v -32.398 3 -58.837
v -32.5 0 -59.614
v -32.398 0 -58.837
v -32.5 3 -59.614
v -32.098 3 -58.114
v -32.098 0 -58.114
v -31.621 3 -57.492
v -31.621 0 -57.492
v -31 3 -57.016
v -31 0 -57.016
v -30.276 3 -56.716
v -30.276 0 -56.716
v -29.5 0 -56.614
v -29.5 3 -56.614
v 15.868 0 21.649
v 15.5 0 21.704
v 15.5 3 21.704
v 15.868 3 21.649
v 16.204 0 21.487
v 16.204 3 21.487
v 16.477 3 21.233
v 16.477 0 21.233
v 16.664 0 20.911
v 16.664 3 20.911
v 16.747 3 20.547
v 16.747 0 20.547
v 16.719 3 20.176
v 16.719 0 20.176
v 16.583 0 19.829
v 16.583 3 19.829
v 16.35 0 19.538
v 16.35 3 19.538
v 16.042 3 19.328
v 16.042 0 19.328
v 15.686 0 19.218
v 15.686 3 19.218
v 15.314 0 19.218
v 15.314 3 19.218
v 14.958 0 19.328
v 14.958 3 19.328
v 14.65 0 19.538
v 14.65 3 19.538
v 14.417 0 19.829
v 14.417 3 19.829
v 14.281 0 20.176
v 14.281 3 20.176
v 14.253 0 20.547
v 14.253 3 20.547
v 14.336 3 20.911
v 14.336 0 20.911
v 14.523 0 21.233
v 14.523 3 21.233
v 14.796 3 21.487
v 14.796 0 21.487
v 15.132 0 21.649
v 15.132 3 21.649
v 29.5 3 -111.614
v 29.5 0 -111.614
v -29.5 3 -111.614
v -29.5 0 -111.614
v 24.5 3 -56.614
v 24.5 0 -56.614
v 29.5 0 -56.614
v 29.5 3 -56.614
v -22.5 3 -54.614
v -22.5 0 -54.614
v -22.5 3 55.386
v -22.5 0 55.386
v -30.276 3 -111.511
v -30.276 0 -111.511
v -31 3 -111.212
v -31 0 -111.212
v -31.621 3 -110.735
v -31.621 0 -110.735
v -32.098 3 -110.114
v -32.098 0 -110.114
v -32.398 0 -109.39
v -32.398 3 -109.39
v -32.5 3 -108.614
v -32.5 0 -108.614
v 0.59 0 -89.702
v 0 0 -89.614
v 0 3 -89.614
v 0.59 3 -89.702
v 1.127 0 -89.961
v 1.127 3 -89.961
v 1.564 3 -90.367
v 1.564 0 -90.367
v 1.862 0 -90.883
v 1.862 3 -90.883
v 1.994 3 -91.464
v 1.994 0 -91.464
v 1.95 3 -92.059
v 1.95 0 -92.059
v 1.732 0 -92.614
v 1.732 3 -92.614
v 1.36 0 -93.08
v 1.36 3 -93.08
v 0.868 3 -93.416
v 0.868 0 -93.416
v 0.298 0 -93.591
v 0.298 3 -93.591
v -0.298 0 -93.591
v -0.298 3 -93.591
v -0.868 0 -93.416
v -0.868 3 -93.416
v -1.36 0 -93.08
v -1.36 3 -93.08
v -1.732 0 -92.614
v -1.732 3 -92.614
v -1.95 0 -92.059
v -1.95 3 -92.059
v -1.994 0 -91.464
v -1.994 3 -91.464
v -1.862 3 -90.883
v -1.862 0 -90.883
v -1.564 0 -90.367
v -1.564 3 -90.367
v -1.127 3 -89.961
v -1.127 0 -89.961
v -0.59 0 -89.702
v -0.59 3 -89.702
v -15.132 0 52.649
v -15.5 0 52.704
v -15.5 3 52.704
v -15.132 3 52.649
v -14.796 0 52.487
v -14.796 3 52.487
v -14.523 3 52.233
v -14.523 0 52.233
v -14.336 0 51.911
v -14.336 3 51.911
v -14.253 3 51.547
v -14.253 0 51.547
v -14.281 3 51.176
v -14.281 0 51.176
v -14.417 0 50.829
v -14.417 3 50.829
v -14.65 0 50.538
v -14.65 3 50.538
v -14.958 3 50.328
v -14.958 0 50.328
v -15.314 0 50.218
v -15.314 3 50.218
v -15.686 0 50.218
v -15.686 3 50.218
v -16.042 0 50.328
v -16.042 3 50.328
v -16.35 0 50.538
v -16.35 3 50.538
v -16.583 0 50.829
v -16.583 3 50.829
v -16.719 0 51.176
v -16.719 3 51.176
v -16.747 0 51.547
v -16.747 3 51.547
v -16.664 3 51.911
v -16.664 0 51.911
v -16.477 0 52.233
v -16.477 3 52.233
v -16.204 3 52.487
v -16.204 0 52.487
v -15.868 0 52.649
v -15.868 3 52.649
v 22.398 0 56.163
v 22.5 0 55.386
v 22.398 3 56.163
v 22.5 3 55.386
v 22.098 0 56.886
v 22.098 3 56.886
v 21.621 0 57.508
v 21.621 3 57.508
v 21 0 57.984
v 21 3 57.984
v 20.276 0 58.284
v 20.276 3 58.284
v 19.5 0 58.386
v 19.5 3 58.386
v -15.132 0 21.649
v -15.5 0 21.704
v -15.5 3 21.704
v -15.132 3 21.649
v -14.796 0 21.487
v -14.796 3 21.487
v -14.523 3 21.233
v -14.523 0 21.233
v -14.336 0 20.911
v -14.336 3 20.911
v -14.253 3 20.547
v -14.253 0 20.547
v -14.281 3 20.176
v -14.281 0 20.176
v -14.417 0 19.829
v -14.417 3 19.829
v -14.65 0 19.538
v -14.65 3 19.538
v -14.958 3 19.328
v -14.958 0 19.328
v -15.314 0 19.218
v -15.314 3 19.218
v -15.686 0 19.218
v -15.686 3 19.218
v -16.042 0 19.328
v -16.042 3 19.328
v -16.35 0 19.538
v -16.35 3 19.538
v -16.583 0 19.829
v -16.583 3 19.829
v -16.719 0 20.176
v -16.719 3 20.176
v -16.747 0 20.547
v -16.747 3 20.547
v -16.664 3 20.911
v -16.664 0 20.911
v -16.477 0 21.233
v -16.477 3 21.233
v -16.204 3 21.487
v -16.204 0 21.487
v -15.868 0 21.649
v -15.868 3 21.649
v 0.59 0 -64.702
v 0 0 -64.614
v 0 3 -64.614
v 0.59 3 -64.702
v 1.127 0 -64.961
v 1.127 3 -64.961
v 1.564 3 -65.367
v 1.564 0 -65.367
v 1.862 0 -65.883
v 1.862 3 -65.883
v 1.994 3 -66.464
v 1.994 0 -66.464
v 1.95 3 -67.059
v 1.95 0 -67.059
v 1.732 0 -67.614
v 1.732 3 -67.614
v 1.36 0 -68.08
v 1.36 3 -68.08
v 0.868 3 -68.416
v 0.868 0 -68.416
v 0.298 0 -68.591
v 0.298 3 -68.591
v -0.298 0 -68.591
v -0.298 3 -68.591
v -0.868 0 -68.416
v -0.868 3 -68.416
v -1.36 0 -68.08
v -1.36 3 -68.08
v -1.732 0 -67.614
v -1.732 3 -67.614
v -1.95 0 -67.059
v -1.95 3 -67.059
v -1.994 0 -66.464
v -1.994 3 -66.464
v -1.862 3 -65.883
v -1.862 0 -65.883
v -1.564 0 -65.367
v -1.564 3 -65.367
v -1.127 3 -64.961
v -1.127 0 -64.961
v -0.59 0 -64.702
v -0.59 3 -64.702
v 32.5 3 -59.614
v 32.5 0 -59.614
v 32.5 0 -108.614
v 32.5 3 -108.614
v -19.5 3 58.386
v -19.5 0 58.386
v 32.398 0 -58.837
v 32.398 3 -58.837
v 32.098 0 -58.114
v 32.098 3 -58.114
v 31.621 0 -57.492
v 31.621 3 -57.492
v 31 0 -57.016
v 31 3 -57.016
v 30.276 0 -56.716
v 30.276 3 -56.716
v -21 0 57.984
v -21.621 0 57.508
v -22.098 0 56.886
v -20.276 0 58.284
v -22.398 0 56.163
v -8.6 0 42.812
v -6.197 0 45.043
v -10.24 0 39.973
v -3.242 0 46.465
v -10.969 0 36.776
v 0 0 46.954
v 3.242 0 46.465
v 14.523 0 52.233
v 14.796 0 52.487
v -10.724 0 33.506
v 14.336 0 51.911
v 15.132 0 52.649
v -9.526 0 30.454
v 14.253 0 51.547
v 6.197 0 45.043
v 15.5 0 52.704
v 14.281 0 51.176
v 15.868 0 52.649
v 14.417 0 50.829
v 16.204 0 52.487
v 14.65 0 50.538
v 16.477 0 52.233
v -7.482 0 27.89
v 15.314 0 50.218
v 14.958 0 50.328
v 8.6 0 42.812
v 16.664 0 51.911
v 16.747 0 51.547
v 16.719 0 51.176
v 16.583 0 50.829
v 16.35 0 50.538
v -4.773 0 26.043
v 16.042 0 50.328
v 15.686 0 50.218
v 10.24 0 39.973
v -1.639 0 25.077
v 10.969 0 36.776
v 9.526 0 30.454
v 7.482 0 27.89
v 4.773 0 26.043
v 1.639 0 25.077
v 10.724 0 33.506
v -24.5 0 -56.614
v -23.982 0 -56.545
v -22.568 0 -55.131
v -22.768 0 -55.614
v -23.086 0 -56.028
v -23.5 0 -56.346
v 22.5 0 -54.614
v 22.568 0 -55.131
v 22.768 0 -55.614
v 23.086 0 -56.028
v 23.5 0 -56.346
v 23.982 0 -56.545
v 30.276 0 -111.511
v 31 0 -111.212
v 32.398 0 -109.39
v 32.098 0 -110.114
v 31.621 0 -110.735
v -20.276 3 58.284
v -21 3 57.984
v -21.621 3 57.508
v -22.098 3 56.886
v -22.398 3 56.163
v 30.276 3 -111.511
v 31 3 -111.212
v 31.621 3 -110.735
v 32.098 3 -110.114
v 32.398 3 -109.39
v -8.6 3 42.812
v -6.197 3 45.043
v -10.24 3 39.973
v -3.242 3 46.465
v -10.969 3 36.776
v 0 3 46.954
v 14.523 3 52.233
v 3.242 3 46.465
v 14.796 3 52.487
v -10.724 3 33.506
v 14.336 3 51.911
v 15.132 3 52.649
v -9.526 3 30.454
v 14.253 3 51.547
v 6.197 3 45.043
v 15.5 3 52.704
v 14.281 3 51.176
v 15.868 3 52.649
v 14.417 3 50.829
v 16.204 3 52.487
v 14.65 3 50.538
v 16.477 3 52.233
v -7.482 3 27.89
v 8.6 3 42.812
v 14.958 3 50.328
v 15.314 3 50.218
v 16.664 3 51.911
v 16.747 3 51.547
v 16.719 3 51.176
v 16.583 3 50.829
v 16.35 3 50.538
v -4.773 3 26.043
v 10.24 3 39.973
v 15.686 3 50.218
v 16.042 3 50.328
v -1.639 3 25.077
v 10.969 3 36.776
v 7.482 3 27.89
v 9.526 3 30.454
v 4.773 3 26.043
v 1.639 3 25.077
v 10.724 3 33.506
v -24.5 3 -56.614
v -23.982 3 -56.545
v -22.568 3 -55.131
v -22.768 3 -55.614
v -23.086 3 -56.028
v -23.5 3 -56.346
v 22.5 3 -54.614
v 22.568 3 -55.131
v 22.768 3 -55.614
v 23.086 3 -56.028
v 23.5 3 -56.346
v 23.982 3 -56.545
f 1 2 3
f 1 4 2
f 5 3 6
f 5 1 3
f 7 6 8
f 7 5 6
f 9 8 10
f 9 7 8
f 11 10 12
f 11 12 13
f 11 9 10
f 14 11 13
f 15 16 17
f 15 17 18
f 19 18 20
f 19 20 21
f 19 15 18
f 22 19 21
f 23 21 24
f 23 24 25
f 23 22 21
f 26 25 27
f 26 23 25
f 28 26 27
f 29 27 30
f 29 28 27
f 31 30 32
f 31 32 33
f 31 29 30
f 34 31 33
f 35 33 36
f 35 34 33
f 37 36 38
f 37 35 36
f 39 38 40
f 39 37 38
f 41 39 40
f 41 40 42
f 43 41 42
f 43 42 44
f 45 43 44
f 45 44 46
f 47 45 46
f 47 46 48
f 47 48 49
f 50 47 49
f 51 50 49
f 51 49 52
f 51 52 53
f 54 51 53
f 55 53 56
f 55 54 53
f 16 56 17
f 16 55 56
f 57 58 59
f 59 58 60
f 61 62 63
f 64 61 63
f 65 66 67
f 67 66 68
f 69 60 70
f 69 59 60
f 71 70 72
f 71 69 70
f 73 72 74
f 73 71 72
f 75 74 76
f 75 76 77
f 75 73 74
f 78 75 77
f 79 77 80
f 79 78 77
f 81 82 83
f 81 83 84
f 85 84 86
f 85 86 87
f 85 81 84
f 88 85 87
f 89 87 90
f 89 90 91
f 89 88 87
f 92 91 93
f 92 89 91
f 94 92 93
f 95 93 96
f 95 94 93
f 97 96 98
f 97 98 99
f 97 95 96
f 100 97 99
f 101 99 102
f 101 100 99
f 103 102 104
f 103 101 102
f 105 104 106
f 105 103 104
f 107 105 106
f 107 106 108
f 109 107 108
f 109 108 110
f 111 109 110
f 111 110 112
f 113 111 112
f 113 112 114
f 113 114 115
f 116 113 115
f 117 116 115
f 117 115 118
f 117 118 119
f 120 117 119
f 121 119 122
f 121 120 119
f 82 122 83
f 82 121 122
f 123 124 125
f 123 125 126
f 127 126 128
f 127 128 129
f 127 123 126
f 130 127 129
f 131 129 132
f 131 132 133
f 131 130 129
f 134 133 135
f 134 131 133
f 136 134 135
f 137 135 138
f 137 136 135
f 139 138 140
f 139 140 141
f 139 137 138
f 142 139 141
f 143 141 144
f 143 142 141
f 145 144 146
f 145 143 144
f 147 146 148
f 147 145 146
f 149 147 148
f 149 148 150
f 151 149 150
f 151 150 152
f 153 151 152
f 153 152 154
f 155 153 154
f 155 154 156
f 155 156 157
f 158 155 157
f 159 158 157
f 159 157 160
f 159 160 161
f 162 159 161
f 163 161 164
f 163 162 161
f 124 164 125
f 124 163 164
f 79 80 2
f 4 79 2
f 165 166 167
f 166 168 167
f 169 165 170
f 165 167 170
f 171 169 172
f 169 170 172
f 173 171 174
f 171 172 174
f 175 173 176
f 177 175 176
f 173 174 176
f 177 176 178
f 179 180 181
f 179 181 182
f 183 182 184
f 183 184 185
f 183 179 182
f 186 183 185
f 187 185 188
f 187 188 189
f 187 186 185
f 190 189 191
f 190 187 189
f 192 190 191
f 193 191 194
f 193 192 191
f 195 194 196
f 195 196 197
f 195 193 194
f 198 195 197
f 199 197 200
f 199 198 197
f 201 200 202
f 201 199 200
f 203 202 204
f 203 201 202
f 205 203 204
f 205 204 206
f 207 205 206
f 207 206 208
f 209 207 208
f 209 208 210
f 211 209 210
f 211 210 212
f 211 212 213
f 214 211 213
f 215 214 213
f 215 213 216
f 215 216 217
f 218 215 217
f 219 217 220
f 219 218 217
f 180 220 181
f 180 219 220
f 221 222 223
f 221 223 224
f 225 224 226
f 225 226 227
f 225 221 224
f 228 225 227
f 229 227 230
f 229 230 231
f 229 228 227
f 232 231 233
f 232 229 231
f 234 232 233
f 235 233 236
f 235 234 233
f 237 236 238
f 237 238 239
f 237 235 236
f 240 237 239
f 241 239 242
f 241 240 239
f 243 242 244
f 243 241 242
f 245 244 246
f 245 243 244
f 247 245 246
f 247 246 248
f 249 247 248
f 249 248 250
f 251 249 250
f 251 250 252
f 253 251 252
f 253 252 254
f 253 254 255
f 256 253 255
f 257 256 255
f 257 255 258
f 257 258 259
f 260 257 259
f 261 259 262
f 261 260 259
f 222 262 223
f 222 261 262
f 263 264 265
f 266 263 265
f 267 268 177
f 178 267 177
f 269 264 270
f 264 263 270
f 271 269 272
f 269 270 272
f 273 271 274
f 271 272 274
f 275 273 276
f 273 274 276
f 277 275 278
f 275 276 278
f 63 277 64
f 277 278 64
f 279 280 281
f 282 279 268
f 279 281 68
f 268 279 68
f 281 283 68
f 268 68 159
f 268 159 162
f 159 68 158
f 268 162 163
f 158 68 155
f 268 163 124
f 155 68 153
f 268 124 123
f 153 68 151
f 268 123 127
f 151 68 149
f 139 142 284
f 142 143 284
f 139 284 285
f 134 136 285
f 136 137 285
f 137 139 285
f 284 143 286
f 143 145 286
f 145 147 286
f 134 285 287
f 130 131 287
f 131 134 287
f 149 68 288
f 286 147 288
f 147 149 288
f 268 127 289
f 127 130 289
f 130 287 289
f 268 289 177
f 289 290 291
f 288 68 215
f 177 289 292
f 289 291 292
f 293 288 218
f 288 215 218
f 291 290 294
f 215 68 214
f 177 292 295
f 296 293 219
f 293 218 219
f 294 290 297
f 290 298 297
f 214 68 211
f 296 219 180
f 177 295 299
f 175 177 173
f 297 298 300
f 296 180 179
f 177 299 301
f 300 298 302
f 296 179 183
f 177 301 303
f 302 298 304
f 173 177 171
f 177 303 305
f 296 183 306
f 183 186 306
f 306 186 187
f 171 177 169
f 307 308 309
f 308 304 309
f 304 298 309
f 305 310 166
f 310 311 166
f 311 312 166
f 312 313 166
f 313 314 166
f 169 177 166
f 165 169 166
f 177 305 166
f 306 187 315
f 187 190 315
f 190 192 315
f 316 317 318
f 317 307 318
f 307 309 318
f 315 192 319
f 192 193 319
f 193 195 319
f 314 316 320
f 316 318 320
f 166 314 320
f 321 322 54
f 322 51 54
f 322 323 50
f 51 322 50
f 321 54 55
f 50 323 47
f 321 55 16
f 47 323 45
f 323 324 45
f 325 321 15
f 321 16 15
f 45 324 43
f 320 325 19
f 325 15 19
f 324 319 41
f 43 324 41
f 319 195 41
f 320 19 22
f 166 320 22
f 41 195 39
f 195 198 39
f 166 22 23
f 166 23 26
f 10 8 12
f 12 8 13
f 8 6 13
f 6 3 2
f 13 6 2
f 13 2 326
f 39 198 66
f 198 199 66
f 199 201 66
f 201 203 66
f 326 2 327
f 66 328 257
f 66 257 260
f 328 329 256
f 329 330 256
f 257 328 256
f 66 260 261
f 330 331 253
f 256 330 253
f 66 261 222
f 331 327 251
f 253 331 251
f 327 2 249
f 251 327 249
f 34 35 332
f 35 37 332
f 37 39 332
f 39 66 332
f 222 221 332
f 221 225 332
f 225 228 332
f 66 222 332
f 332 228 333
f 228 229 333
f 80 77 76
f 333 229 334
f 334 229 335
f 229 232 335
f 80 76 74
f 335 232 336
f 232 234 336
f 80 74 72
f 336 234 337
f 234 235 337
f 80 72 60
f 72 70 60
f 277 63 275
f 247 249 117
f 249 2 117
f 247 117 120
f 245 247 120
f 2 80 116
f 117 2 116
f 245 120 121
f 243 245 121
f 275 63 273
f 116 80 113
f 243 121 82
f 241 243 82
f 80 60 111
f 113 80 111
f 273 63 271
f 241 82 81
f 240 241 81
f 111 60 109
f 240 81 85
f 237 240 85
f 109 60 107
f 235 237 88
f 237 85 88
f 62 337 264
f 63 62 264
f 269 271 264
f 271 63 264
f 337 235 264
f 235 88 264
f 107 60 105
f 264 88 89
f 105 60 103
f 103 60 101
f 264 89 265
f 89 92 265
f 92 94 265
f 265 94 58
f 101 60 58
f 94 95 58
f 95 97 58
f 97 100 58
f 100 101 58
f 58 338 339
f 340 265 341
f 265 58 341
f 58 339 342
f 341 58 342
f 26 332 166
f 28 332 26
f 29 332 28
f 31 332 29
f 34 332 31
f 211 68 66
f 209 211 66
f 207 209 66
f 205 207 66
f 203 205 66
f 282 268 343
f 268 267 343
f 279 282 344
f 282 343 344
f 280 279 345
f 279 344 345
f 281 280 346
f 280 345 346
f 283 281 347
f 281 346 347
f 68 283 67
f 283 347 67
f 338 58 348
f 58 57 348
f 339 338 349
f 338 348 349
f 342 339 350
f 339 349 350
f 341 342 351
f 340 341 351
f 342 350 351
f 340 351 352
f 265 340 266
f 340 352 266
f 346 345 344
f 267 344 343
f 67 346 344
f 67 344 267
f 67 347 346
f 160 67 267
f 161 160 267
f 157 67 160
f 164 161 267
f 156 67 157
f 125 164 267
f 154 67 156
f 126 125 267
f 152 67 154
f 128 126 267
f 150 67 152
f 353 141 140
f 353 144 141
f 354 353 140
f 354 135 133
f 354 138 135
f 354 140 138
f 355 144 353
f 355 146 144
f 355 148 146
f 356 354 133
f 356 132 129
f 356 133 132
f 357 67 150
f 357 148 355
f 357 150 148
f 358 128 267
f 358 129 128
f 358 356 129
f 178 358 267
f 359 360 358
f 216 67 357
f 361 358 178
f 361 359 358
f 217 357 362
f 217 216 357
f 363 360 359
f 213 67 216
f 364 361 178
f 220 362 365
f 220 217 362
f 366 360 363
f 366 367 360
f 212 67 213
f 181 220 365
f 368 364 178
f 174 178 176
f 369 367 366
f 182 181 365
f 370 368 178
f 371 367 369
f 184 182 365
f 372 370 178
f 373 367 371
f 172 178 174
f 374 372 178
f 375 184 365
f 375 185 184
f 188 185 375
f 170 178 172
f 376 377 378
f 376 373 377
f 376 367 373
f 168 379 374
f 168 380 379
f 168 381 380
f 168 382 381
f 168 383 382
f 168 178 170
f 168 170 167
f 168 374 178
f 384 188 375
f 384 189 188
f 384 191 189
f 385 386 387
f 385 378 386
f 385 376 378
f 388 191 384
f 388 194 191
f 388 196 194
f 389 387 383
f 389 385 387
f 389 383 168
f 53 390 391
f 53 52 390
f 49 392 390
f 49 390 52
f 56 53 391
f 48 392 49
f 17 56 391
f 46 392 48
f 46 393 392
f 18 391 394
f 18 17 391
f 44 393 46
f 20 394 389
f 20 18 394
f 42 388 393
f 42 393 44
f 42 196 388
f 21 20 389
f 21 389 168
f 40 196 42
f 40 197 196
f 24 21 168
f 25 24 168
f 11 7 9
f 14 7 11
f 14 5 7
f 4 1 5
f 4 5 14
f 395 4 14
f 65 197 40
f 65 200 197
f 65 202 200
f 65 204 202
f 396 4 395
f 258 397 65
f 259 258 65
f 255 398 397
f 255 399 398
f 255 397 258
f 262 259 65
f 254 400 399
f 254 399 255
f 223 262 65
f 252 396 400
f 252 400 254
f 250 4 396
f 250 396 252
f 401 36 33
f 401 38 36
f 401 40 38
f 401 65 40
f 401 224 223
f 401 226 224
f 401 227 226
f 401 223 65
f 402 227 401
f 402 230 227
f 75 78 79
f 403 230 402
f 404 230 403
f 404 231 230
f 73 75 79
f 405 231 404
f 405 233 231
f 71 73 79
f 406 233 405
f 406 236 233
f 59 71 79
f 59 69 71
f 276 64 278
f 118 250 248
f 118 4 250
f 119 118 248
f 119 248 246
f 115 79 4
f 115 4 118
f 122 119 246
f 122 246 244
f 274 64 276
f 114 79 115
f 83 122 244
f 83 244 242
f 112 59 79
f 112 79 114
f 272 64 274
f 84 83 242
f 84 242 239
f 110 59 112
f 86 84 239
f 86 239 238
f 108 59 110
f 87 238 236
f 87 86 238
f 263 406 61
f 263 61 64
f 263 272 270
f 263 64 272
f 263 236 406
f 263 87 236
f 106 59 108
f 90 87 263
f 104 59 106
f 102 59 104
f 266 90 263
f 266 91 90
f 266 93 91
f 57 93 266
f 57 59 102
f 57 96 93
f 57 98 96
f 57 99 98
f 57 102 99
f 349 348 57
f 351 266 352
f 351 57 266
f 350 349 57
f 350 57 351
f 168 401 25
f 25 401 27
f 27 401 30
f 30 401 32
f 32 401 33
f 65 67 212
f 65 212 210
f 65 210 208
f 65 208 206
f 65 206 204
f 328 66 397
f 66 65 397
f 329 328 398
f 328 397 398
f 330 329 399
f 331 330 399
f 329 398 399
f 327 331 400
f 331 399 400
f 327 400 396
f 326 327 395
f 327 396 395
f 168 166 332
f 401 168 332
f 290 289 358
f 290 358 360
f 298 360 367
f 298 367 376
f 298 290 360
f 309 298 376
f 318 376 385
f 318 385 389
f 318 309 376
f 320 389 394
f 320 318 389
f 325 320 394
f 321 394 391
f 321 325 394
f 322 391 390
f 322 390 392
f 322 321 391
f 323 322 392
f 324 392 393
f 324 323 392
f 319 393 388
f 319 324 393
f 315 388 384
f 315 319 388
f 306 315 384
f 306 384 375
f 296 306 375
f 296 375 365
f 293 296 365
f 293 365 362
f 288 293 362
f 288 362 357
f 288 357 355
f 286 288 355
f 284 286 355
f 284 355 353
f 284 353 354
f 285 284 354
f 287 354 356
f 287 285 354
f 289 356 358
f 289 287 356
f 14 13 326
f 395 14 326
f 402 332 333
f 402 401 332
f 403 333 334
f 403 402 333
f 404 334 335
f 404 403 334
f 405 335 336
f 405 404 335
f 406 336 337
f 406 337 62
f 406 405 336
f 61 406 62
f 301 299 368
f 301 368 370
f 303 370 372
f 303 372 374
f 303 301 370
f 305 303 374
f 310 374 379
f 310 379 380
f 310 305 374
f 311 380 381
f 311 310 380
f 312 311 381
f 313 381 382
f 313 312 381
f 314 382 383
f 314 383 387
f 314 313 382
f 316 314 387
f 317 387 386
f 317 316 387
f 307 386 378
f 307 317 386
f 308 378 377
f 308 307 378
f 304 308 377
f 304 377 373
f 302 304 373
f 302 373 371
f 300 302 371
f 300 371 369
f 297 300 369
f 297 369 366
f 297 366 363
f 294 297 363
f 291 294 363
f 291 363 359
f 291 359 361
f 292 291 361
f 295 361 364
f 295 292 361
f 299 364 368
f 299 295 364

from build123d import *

# Parameters (mm, degrees)
SKETCH1_R           = 2
SKETCH1_R_2         = 1.25
SKETCH1_R_3         = 11
BOSS_EXTRUDE1_DEPTH = 3
FILLET1_R           = 3
FILLET2_R           = 3
FILLET3_R           = 3
FILLET4_R           = 3
FILLET5_R           = 3
FILLET7_R           = 3
FILLET8_R           = 2
FILLET9_R           = 2


with BuildPart() as part:
    # Sketch1 → Boss-Extrude1 (new body)
    with BuildSketch(Plane(origin=(0, 0, 0), x_dir=(1, 0, 0), z_dir=(0, 1, 0))):
        Polygon((0, 111.61362417), (-32.5, 111.61362417), (-32.5, 56.61362417), (-22.5, 56.61362417), (-22.5, -58.38637583), (0, -58.38637583), (22.5, -58.38637583), (22.5, 56.61362417), (32.5, 56.61362417), (32.5, 111.61362417), align=None)
        with Locations(Location((0, 91.61362417, 0), (0, 0, 270))):
            Circle(SKETCH1_R, mode=Mode.SUBTRACT)
        with Locations(Location((0, 66.61362417, 0), (0, 0, 270))):
            Circle(SKETCH1_R, mode=Mode.SUBTRACT)
        with Locations(Location((-15.5, -20.454039675, 0), (0, 0, 270))):
            Circle(SKETCH1_R_2, mode=Mode.SUBTRACT)
        with Locations(Location((-15.5, -51.454039675, 0), (0, 0, 270))):
            Circle(SKETCH1_R_2, mode=Mode.SUBTRACT)
        with Locations(Location((15.5, -51.454039675, 0), (0, 0, 270))):
            Circle(SKETCH1_R_2, mode=Mode.SUBTRACT)
        with Locations(Location((15.5, -20.454039675, 0), (0, 0, 270))):
            Circle(SKETCH1_R_2, mode=Mode.SUBTRACT)
        with Locations(Location((0, -35.954039675, 0), (0, 0, 270))):
            Circle(SKETCH1_R_3, mode=Mode.SUBTRACT)
    extrude(amount=BOSS_EXTRUDE1_DEPTH)

    # Fillet1
    fillet1_edges = [part.edges().sort_by_distance(p)[0] for p in [
        (32.5, 1.5, -111.61362417),
    ]]
    fillet(fillet1_edges, radius=FILLET1_R)

    # Fillet2
    fillet2_edges = [part.edges().sort_by_distance(p)[0] for p in [
        (-32.5, 1.5, -111.61362417),
    ]]
    fillet(fillet2_edges, radius=FILLET2_R)

    # Fillet3
    fillet3_edges = [part.edges().sort_by_distance(p)[0] for p in [
        (-32.5, 1.5, -56.61362417),
    ]]
    fillet(fillet3_edges, radius=FILLET3_R)

    # Fillet4
    fillet4_edges = [part.edges().sort_by_distance(p)[0] for p in [
        (32.5, 1.5, -56.61362417),
    ]]
    fillet(fillet4_edges, radius=FILLET4_R)

    # Fillet5
    fillet5_edges = [part.edges().sort_by_distance(p)[0] for p in [
        (22.5, 1.5, 58.38637583),
    ]]
    fillet(fillet5_edges, radius=FILLET5_R)

    # Fillet7
    fillet7_edges = [part.edges().sort_by_distance(p)[0] for p in [
        (-22.5, 1.5, 58.38637583),
    ]]
    fillet(fillet7_edges, radius=FILLET7_R)

    # Fillet8
    fillet8_edges = [part.edges().sort_by_distance(p)[0] for p in [
        (-22.5, 1.5, -56.61362417),
    ]]
    fillet(fillet8_edges, radius=FILLET8_R)

    # Fillet9
    fillet9_edges = [part.edges().sort_by_distance(p)[0] for p in [
        (22.5, 1.5, -56.61362417),
    ]]
    fillet(fillet9_edges, radius=FILLET9_R)


solid = part.part
